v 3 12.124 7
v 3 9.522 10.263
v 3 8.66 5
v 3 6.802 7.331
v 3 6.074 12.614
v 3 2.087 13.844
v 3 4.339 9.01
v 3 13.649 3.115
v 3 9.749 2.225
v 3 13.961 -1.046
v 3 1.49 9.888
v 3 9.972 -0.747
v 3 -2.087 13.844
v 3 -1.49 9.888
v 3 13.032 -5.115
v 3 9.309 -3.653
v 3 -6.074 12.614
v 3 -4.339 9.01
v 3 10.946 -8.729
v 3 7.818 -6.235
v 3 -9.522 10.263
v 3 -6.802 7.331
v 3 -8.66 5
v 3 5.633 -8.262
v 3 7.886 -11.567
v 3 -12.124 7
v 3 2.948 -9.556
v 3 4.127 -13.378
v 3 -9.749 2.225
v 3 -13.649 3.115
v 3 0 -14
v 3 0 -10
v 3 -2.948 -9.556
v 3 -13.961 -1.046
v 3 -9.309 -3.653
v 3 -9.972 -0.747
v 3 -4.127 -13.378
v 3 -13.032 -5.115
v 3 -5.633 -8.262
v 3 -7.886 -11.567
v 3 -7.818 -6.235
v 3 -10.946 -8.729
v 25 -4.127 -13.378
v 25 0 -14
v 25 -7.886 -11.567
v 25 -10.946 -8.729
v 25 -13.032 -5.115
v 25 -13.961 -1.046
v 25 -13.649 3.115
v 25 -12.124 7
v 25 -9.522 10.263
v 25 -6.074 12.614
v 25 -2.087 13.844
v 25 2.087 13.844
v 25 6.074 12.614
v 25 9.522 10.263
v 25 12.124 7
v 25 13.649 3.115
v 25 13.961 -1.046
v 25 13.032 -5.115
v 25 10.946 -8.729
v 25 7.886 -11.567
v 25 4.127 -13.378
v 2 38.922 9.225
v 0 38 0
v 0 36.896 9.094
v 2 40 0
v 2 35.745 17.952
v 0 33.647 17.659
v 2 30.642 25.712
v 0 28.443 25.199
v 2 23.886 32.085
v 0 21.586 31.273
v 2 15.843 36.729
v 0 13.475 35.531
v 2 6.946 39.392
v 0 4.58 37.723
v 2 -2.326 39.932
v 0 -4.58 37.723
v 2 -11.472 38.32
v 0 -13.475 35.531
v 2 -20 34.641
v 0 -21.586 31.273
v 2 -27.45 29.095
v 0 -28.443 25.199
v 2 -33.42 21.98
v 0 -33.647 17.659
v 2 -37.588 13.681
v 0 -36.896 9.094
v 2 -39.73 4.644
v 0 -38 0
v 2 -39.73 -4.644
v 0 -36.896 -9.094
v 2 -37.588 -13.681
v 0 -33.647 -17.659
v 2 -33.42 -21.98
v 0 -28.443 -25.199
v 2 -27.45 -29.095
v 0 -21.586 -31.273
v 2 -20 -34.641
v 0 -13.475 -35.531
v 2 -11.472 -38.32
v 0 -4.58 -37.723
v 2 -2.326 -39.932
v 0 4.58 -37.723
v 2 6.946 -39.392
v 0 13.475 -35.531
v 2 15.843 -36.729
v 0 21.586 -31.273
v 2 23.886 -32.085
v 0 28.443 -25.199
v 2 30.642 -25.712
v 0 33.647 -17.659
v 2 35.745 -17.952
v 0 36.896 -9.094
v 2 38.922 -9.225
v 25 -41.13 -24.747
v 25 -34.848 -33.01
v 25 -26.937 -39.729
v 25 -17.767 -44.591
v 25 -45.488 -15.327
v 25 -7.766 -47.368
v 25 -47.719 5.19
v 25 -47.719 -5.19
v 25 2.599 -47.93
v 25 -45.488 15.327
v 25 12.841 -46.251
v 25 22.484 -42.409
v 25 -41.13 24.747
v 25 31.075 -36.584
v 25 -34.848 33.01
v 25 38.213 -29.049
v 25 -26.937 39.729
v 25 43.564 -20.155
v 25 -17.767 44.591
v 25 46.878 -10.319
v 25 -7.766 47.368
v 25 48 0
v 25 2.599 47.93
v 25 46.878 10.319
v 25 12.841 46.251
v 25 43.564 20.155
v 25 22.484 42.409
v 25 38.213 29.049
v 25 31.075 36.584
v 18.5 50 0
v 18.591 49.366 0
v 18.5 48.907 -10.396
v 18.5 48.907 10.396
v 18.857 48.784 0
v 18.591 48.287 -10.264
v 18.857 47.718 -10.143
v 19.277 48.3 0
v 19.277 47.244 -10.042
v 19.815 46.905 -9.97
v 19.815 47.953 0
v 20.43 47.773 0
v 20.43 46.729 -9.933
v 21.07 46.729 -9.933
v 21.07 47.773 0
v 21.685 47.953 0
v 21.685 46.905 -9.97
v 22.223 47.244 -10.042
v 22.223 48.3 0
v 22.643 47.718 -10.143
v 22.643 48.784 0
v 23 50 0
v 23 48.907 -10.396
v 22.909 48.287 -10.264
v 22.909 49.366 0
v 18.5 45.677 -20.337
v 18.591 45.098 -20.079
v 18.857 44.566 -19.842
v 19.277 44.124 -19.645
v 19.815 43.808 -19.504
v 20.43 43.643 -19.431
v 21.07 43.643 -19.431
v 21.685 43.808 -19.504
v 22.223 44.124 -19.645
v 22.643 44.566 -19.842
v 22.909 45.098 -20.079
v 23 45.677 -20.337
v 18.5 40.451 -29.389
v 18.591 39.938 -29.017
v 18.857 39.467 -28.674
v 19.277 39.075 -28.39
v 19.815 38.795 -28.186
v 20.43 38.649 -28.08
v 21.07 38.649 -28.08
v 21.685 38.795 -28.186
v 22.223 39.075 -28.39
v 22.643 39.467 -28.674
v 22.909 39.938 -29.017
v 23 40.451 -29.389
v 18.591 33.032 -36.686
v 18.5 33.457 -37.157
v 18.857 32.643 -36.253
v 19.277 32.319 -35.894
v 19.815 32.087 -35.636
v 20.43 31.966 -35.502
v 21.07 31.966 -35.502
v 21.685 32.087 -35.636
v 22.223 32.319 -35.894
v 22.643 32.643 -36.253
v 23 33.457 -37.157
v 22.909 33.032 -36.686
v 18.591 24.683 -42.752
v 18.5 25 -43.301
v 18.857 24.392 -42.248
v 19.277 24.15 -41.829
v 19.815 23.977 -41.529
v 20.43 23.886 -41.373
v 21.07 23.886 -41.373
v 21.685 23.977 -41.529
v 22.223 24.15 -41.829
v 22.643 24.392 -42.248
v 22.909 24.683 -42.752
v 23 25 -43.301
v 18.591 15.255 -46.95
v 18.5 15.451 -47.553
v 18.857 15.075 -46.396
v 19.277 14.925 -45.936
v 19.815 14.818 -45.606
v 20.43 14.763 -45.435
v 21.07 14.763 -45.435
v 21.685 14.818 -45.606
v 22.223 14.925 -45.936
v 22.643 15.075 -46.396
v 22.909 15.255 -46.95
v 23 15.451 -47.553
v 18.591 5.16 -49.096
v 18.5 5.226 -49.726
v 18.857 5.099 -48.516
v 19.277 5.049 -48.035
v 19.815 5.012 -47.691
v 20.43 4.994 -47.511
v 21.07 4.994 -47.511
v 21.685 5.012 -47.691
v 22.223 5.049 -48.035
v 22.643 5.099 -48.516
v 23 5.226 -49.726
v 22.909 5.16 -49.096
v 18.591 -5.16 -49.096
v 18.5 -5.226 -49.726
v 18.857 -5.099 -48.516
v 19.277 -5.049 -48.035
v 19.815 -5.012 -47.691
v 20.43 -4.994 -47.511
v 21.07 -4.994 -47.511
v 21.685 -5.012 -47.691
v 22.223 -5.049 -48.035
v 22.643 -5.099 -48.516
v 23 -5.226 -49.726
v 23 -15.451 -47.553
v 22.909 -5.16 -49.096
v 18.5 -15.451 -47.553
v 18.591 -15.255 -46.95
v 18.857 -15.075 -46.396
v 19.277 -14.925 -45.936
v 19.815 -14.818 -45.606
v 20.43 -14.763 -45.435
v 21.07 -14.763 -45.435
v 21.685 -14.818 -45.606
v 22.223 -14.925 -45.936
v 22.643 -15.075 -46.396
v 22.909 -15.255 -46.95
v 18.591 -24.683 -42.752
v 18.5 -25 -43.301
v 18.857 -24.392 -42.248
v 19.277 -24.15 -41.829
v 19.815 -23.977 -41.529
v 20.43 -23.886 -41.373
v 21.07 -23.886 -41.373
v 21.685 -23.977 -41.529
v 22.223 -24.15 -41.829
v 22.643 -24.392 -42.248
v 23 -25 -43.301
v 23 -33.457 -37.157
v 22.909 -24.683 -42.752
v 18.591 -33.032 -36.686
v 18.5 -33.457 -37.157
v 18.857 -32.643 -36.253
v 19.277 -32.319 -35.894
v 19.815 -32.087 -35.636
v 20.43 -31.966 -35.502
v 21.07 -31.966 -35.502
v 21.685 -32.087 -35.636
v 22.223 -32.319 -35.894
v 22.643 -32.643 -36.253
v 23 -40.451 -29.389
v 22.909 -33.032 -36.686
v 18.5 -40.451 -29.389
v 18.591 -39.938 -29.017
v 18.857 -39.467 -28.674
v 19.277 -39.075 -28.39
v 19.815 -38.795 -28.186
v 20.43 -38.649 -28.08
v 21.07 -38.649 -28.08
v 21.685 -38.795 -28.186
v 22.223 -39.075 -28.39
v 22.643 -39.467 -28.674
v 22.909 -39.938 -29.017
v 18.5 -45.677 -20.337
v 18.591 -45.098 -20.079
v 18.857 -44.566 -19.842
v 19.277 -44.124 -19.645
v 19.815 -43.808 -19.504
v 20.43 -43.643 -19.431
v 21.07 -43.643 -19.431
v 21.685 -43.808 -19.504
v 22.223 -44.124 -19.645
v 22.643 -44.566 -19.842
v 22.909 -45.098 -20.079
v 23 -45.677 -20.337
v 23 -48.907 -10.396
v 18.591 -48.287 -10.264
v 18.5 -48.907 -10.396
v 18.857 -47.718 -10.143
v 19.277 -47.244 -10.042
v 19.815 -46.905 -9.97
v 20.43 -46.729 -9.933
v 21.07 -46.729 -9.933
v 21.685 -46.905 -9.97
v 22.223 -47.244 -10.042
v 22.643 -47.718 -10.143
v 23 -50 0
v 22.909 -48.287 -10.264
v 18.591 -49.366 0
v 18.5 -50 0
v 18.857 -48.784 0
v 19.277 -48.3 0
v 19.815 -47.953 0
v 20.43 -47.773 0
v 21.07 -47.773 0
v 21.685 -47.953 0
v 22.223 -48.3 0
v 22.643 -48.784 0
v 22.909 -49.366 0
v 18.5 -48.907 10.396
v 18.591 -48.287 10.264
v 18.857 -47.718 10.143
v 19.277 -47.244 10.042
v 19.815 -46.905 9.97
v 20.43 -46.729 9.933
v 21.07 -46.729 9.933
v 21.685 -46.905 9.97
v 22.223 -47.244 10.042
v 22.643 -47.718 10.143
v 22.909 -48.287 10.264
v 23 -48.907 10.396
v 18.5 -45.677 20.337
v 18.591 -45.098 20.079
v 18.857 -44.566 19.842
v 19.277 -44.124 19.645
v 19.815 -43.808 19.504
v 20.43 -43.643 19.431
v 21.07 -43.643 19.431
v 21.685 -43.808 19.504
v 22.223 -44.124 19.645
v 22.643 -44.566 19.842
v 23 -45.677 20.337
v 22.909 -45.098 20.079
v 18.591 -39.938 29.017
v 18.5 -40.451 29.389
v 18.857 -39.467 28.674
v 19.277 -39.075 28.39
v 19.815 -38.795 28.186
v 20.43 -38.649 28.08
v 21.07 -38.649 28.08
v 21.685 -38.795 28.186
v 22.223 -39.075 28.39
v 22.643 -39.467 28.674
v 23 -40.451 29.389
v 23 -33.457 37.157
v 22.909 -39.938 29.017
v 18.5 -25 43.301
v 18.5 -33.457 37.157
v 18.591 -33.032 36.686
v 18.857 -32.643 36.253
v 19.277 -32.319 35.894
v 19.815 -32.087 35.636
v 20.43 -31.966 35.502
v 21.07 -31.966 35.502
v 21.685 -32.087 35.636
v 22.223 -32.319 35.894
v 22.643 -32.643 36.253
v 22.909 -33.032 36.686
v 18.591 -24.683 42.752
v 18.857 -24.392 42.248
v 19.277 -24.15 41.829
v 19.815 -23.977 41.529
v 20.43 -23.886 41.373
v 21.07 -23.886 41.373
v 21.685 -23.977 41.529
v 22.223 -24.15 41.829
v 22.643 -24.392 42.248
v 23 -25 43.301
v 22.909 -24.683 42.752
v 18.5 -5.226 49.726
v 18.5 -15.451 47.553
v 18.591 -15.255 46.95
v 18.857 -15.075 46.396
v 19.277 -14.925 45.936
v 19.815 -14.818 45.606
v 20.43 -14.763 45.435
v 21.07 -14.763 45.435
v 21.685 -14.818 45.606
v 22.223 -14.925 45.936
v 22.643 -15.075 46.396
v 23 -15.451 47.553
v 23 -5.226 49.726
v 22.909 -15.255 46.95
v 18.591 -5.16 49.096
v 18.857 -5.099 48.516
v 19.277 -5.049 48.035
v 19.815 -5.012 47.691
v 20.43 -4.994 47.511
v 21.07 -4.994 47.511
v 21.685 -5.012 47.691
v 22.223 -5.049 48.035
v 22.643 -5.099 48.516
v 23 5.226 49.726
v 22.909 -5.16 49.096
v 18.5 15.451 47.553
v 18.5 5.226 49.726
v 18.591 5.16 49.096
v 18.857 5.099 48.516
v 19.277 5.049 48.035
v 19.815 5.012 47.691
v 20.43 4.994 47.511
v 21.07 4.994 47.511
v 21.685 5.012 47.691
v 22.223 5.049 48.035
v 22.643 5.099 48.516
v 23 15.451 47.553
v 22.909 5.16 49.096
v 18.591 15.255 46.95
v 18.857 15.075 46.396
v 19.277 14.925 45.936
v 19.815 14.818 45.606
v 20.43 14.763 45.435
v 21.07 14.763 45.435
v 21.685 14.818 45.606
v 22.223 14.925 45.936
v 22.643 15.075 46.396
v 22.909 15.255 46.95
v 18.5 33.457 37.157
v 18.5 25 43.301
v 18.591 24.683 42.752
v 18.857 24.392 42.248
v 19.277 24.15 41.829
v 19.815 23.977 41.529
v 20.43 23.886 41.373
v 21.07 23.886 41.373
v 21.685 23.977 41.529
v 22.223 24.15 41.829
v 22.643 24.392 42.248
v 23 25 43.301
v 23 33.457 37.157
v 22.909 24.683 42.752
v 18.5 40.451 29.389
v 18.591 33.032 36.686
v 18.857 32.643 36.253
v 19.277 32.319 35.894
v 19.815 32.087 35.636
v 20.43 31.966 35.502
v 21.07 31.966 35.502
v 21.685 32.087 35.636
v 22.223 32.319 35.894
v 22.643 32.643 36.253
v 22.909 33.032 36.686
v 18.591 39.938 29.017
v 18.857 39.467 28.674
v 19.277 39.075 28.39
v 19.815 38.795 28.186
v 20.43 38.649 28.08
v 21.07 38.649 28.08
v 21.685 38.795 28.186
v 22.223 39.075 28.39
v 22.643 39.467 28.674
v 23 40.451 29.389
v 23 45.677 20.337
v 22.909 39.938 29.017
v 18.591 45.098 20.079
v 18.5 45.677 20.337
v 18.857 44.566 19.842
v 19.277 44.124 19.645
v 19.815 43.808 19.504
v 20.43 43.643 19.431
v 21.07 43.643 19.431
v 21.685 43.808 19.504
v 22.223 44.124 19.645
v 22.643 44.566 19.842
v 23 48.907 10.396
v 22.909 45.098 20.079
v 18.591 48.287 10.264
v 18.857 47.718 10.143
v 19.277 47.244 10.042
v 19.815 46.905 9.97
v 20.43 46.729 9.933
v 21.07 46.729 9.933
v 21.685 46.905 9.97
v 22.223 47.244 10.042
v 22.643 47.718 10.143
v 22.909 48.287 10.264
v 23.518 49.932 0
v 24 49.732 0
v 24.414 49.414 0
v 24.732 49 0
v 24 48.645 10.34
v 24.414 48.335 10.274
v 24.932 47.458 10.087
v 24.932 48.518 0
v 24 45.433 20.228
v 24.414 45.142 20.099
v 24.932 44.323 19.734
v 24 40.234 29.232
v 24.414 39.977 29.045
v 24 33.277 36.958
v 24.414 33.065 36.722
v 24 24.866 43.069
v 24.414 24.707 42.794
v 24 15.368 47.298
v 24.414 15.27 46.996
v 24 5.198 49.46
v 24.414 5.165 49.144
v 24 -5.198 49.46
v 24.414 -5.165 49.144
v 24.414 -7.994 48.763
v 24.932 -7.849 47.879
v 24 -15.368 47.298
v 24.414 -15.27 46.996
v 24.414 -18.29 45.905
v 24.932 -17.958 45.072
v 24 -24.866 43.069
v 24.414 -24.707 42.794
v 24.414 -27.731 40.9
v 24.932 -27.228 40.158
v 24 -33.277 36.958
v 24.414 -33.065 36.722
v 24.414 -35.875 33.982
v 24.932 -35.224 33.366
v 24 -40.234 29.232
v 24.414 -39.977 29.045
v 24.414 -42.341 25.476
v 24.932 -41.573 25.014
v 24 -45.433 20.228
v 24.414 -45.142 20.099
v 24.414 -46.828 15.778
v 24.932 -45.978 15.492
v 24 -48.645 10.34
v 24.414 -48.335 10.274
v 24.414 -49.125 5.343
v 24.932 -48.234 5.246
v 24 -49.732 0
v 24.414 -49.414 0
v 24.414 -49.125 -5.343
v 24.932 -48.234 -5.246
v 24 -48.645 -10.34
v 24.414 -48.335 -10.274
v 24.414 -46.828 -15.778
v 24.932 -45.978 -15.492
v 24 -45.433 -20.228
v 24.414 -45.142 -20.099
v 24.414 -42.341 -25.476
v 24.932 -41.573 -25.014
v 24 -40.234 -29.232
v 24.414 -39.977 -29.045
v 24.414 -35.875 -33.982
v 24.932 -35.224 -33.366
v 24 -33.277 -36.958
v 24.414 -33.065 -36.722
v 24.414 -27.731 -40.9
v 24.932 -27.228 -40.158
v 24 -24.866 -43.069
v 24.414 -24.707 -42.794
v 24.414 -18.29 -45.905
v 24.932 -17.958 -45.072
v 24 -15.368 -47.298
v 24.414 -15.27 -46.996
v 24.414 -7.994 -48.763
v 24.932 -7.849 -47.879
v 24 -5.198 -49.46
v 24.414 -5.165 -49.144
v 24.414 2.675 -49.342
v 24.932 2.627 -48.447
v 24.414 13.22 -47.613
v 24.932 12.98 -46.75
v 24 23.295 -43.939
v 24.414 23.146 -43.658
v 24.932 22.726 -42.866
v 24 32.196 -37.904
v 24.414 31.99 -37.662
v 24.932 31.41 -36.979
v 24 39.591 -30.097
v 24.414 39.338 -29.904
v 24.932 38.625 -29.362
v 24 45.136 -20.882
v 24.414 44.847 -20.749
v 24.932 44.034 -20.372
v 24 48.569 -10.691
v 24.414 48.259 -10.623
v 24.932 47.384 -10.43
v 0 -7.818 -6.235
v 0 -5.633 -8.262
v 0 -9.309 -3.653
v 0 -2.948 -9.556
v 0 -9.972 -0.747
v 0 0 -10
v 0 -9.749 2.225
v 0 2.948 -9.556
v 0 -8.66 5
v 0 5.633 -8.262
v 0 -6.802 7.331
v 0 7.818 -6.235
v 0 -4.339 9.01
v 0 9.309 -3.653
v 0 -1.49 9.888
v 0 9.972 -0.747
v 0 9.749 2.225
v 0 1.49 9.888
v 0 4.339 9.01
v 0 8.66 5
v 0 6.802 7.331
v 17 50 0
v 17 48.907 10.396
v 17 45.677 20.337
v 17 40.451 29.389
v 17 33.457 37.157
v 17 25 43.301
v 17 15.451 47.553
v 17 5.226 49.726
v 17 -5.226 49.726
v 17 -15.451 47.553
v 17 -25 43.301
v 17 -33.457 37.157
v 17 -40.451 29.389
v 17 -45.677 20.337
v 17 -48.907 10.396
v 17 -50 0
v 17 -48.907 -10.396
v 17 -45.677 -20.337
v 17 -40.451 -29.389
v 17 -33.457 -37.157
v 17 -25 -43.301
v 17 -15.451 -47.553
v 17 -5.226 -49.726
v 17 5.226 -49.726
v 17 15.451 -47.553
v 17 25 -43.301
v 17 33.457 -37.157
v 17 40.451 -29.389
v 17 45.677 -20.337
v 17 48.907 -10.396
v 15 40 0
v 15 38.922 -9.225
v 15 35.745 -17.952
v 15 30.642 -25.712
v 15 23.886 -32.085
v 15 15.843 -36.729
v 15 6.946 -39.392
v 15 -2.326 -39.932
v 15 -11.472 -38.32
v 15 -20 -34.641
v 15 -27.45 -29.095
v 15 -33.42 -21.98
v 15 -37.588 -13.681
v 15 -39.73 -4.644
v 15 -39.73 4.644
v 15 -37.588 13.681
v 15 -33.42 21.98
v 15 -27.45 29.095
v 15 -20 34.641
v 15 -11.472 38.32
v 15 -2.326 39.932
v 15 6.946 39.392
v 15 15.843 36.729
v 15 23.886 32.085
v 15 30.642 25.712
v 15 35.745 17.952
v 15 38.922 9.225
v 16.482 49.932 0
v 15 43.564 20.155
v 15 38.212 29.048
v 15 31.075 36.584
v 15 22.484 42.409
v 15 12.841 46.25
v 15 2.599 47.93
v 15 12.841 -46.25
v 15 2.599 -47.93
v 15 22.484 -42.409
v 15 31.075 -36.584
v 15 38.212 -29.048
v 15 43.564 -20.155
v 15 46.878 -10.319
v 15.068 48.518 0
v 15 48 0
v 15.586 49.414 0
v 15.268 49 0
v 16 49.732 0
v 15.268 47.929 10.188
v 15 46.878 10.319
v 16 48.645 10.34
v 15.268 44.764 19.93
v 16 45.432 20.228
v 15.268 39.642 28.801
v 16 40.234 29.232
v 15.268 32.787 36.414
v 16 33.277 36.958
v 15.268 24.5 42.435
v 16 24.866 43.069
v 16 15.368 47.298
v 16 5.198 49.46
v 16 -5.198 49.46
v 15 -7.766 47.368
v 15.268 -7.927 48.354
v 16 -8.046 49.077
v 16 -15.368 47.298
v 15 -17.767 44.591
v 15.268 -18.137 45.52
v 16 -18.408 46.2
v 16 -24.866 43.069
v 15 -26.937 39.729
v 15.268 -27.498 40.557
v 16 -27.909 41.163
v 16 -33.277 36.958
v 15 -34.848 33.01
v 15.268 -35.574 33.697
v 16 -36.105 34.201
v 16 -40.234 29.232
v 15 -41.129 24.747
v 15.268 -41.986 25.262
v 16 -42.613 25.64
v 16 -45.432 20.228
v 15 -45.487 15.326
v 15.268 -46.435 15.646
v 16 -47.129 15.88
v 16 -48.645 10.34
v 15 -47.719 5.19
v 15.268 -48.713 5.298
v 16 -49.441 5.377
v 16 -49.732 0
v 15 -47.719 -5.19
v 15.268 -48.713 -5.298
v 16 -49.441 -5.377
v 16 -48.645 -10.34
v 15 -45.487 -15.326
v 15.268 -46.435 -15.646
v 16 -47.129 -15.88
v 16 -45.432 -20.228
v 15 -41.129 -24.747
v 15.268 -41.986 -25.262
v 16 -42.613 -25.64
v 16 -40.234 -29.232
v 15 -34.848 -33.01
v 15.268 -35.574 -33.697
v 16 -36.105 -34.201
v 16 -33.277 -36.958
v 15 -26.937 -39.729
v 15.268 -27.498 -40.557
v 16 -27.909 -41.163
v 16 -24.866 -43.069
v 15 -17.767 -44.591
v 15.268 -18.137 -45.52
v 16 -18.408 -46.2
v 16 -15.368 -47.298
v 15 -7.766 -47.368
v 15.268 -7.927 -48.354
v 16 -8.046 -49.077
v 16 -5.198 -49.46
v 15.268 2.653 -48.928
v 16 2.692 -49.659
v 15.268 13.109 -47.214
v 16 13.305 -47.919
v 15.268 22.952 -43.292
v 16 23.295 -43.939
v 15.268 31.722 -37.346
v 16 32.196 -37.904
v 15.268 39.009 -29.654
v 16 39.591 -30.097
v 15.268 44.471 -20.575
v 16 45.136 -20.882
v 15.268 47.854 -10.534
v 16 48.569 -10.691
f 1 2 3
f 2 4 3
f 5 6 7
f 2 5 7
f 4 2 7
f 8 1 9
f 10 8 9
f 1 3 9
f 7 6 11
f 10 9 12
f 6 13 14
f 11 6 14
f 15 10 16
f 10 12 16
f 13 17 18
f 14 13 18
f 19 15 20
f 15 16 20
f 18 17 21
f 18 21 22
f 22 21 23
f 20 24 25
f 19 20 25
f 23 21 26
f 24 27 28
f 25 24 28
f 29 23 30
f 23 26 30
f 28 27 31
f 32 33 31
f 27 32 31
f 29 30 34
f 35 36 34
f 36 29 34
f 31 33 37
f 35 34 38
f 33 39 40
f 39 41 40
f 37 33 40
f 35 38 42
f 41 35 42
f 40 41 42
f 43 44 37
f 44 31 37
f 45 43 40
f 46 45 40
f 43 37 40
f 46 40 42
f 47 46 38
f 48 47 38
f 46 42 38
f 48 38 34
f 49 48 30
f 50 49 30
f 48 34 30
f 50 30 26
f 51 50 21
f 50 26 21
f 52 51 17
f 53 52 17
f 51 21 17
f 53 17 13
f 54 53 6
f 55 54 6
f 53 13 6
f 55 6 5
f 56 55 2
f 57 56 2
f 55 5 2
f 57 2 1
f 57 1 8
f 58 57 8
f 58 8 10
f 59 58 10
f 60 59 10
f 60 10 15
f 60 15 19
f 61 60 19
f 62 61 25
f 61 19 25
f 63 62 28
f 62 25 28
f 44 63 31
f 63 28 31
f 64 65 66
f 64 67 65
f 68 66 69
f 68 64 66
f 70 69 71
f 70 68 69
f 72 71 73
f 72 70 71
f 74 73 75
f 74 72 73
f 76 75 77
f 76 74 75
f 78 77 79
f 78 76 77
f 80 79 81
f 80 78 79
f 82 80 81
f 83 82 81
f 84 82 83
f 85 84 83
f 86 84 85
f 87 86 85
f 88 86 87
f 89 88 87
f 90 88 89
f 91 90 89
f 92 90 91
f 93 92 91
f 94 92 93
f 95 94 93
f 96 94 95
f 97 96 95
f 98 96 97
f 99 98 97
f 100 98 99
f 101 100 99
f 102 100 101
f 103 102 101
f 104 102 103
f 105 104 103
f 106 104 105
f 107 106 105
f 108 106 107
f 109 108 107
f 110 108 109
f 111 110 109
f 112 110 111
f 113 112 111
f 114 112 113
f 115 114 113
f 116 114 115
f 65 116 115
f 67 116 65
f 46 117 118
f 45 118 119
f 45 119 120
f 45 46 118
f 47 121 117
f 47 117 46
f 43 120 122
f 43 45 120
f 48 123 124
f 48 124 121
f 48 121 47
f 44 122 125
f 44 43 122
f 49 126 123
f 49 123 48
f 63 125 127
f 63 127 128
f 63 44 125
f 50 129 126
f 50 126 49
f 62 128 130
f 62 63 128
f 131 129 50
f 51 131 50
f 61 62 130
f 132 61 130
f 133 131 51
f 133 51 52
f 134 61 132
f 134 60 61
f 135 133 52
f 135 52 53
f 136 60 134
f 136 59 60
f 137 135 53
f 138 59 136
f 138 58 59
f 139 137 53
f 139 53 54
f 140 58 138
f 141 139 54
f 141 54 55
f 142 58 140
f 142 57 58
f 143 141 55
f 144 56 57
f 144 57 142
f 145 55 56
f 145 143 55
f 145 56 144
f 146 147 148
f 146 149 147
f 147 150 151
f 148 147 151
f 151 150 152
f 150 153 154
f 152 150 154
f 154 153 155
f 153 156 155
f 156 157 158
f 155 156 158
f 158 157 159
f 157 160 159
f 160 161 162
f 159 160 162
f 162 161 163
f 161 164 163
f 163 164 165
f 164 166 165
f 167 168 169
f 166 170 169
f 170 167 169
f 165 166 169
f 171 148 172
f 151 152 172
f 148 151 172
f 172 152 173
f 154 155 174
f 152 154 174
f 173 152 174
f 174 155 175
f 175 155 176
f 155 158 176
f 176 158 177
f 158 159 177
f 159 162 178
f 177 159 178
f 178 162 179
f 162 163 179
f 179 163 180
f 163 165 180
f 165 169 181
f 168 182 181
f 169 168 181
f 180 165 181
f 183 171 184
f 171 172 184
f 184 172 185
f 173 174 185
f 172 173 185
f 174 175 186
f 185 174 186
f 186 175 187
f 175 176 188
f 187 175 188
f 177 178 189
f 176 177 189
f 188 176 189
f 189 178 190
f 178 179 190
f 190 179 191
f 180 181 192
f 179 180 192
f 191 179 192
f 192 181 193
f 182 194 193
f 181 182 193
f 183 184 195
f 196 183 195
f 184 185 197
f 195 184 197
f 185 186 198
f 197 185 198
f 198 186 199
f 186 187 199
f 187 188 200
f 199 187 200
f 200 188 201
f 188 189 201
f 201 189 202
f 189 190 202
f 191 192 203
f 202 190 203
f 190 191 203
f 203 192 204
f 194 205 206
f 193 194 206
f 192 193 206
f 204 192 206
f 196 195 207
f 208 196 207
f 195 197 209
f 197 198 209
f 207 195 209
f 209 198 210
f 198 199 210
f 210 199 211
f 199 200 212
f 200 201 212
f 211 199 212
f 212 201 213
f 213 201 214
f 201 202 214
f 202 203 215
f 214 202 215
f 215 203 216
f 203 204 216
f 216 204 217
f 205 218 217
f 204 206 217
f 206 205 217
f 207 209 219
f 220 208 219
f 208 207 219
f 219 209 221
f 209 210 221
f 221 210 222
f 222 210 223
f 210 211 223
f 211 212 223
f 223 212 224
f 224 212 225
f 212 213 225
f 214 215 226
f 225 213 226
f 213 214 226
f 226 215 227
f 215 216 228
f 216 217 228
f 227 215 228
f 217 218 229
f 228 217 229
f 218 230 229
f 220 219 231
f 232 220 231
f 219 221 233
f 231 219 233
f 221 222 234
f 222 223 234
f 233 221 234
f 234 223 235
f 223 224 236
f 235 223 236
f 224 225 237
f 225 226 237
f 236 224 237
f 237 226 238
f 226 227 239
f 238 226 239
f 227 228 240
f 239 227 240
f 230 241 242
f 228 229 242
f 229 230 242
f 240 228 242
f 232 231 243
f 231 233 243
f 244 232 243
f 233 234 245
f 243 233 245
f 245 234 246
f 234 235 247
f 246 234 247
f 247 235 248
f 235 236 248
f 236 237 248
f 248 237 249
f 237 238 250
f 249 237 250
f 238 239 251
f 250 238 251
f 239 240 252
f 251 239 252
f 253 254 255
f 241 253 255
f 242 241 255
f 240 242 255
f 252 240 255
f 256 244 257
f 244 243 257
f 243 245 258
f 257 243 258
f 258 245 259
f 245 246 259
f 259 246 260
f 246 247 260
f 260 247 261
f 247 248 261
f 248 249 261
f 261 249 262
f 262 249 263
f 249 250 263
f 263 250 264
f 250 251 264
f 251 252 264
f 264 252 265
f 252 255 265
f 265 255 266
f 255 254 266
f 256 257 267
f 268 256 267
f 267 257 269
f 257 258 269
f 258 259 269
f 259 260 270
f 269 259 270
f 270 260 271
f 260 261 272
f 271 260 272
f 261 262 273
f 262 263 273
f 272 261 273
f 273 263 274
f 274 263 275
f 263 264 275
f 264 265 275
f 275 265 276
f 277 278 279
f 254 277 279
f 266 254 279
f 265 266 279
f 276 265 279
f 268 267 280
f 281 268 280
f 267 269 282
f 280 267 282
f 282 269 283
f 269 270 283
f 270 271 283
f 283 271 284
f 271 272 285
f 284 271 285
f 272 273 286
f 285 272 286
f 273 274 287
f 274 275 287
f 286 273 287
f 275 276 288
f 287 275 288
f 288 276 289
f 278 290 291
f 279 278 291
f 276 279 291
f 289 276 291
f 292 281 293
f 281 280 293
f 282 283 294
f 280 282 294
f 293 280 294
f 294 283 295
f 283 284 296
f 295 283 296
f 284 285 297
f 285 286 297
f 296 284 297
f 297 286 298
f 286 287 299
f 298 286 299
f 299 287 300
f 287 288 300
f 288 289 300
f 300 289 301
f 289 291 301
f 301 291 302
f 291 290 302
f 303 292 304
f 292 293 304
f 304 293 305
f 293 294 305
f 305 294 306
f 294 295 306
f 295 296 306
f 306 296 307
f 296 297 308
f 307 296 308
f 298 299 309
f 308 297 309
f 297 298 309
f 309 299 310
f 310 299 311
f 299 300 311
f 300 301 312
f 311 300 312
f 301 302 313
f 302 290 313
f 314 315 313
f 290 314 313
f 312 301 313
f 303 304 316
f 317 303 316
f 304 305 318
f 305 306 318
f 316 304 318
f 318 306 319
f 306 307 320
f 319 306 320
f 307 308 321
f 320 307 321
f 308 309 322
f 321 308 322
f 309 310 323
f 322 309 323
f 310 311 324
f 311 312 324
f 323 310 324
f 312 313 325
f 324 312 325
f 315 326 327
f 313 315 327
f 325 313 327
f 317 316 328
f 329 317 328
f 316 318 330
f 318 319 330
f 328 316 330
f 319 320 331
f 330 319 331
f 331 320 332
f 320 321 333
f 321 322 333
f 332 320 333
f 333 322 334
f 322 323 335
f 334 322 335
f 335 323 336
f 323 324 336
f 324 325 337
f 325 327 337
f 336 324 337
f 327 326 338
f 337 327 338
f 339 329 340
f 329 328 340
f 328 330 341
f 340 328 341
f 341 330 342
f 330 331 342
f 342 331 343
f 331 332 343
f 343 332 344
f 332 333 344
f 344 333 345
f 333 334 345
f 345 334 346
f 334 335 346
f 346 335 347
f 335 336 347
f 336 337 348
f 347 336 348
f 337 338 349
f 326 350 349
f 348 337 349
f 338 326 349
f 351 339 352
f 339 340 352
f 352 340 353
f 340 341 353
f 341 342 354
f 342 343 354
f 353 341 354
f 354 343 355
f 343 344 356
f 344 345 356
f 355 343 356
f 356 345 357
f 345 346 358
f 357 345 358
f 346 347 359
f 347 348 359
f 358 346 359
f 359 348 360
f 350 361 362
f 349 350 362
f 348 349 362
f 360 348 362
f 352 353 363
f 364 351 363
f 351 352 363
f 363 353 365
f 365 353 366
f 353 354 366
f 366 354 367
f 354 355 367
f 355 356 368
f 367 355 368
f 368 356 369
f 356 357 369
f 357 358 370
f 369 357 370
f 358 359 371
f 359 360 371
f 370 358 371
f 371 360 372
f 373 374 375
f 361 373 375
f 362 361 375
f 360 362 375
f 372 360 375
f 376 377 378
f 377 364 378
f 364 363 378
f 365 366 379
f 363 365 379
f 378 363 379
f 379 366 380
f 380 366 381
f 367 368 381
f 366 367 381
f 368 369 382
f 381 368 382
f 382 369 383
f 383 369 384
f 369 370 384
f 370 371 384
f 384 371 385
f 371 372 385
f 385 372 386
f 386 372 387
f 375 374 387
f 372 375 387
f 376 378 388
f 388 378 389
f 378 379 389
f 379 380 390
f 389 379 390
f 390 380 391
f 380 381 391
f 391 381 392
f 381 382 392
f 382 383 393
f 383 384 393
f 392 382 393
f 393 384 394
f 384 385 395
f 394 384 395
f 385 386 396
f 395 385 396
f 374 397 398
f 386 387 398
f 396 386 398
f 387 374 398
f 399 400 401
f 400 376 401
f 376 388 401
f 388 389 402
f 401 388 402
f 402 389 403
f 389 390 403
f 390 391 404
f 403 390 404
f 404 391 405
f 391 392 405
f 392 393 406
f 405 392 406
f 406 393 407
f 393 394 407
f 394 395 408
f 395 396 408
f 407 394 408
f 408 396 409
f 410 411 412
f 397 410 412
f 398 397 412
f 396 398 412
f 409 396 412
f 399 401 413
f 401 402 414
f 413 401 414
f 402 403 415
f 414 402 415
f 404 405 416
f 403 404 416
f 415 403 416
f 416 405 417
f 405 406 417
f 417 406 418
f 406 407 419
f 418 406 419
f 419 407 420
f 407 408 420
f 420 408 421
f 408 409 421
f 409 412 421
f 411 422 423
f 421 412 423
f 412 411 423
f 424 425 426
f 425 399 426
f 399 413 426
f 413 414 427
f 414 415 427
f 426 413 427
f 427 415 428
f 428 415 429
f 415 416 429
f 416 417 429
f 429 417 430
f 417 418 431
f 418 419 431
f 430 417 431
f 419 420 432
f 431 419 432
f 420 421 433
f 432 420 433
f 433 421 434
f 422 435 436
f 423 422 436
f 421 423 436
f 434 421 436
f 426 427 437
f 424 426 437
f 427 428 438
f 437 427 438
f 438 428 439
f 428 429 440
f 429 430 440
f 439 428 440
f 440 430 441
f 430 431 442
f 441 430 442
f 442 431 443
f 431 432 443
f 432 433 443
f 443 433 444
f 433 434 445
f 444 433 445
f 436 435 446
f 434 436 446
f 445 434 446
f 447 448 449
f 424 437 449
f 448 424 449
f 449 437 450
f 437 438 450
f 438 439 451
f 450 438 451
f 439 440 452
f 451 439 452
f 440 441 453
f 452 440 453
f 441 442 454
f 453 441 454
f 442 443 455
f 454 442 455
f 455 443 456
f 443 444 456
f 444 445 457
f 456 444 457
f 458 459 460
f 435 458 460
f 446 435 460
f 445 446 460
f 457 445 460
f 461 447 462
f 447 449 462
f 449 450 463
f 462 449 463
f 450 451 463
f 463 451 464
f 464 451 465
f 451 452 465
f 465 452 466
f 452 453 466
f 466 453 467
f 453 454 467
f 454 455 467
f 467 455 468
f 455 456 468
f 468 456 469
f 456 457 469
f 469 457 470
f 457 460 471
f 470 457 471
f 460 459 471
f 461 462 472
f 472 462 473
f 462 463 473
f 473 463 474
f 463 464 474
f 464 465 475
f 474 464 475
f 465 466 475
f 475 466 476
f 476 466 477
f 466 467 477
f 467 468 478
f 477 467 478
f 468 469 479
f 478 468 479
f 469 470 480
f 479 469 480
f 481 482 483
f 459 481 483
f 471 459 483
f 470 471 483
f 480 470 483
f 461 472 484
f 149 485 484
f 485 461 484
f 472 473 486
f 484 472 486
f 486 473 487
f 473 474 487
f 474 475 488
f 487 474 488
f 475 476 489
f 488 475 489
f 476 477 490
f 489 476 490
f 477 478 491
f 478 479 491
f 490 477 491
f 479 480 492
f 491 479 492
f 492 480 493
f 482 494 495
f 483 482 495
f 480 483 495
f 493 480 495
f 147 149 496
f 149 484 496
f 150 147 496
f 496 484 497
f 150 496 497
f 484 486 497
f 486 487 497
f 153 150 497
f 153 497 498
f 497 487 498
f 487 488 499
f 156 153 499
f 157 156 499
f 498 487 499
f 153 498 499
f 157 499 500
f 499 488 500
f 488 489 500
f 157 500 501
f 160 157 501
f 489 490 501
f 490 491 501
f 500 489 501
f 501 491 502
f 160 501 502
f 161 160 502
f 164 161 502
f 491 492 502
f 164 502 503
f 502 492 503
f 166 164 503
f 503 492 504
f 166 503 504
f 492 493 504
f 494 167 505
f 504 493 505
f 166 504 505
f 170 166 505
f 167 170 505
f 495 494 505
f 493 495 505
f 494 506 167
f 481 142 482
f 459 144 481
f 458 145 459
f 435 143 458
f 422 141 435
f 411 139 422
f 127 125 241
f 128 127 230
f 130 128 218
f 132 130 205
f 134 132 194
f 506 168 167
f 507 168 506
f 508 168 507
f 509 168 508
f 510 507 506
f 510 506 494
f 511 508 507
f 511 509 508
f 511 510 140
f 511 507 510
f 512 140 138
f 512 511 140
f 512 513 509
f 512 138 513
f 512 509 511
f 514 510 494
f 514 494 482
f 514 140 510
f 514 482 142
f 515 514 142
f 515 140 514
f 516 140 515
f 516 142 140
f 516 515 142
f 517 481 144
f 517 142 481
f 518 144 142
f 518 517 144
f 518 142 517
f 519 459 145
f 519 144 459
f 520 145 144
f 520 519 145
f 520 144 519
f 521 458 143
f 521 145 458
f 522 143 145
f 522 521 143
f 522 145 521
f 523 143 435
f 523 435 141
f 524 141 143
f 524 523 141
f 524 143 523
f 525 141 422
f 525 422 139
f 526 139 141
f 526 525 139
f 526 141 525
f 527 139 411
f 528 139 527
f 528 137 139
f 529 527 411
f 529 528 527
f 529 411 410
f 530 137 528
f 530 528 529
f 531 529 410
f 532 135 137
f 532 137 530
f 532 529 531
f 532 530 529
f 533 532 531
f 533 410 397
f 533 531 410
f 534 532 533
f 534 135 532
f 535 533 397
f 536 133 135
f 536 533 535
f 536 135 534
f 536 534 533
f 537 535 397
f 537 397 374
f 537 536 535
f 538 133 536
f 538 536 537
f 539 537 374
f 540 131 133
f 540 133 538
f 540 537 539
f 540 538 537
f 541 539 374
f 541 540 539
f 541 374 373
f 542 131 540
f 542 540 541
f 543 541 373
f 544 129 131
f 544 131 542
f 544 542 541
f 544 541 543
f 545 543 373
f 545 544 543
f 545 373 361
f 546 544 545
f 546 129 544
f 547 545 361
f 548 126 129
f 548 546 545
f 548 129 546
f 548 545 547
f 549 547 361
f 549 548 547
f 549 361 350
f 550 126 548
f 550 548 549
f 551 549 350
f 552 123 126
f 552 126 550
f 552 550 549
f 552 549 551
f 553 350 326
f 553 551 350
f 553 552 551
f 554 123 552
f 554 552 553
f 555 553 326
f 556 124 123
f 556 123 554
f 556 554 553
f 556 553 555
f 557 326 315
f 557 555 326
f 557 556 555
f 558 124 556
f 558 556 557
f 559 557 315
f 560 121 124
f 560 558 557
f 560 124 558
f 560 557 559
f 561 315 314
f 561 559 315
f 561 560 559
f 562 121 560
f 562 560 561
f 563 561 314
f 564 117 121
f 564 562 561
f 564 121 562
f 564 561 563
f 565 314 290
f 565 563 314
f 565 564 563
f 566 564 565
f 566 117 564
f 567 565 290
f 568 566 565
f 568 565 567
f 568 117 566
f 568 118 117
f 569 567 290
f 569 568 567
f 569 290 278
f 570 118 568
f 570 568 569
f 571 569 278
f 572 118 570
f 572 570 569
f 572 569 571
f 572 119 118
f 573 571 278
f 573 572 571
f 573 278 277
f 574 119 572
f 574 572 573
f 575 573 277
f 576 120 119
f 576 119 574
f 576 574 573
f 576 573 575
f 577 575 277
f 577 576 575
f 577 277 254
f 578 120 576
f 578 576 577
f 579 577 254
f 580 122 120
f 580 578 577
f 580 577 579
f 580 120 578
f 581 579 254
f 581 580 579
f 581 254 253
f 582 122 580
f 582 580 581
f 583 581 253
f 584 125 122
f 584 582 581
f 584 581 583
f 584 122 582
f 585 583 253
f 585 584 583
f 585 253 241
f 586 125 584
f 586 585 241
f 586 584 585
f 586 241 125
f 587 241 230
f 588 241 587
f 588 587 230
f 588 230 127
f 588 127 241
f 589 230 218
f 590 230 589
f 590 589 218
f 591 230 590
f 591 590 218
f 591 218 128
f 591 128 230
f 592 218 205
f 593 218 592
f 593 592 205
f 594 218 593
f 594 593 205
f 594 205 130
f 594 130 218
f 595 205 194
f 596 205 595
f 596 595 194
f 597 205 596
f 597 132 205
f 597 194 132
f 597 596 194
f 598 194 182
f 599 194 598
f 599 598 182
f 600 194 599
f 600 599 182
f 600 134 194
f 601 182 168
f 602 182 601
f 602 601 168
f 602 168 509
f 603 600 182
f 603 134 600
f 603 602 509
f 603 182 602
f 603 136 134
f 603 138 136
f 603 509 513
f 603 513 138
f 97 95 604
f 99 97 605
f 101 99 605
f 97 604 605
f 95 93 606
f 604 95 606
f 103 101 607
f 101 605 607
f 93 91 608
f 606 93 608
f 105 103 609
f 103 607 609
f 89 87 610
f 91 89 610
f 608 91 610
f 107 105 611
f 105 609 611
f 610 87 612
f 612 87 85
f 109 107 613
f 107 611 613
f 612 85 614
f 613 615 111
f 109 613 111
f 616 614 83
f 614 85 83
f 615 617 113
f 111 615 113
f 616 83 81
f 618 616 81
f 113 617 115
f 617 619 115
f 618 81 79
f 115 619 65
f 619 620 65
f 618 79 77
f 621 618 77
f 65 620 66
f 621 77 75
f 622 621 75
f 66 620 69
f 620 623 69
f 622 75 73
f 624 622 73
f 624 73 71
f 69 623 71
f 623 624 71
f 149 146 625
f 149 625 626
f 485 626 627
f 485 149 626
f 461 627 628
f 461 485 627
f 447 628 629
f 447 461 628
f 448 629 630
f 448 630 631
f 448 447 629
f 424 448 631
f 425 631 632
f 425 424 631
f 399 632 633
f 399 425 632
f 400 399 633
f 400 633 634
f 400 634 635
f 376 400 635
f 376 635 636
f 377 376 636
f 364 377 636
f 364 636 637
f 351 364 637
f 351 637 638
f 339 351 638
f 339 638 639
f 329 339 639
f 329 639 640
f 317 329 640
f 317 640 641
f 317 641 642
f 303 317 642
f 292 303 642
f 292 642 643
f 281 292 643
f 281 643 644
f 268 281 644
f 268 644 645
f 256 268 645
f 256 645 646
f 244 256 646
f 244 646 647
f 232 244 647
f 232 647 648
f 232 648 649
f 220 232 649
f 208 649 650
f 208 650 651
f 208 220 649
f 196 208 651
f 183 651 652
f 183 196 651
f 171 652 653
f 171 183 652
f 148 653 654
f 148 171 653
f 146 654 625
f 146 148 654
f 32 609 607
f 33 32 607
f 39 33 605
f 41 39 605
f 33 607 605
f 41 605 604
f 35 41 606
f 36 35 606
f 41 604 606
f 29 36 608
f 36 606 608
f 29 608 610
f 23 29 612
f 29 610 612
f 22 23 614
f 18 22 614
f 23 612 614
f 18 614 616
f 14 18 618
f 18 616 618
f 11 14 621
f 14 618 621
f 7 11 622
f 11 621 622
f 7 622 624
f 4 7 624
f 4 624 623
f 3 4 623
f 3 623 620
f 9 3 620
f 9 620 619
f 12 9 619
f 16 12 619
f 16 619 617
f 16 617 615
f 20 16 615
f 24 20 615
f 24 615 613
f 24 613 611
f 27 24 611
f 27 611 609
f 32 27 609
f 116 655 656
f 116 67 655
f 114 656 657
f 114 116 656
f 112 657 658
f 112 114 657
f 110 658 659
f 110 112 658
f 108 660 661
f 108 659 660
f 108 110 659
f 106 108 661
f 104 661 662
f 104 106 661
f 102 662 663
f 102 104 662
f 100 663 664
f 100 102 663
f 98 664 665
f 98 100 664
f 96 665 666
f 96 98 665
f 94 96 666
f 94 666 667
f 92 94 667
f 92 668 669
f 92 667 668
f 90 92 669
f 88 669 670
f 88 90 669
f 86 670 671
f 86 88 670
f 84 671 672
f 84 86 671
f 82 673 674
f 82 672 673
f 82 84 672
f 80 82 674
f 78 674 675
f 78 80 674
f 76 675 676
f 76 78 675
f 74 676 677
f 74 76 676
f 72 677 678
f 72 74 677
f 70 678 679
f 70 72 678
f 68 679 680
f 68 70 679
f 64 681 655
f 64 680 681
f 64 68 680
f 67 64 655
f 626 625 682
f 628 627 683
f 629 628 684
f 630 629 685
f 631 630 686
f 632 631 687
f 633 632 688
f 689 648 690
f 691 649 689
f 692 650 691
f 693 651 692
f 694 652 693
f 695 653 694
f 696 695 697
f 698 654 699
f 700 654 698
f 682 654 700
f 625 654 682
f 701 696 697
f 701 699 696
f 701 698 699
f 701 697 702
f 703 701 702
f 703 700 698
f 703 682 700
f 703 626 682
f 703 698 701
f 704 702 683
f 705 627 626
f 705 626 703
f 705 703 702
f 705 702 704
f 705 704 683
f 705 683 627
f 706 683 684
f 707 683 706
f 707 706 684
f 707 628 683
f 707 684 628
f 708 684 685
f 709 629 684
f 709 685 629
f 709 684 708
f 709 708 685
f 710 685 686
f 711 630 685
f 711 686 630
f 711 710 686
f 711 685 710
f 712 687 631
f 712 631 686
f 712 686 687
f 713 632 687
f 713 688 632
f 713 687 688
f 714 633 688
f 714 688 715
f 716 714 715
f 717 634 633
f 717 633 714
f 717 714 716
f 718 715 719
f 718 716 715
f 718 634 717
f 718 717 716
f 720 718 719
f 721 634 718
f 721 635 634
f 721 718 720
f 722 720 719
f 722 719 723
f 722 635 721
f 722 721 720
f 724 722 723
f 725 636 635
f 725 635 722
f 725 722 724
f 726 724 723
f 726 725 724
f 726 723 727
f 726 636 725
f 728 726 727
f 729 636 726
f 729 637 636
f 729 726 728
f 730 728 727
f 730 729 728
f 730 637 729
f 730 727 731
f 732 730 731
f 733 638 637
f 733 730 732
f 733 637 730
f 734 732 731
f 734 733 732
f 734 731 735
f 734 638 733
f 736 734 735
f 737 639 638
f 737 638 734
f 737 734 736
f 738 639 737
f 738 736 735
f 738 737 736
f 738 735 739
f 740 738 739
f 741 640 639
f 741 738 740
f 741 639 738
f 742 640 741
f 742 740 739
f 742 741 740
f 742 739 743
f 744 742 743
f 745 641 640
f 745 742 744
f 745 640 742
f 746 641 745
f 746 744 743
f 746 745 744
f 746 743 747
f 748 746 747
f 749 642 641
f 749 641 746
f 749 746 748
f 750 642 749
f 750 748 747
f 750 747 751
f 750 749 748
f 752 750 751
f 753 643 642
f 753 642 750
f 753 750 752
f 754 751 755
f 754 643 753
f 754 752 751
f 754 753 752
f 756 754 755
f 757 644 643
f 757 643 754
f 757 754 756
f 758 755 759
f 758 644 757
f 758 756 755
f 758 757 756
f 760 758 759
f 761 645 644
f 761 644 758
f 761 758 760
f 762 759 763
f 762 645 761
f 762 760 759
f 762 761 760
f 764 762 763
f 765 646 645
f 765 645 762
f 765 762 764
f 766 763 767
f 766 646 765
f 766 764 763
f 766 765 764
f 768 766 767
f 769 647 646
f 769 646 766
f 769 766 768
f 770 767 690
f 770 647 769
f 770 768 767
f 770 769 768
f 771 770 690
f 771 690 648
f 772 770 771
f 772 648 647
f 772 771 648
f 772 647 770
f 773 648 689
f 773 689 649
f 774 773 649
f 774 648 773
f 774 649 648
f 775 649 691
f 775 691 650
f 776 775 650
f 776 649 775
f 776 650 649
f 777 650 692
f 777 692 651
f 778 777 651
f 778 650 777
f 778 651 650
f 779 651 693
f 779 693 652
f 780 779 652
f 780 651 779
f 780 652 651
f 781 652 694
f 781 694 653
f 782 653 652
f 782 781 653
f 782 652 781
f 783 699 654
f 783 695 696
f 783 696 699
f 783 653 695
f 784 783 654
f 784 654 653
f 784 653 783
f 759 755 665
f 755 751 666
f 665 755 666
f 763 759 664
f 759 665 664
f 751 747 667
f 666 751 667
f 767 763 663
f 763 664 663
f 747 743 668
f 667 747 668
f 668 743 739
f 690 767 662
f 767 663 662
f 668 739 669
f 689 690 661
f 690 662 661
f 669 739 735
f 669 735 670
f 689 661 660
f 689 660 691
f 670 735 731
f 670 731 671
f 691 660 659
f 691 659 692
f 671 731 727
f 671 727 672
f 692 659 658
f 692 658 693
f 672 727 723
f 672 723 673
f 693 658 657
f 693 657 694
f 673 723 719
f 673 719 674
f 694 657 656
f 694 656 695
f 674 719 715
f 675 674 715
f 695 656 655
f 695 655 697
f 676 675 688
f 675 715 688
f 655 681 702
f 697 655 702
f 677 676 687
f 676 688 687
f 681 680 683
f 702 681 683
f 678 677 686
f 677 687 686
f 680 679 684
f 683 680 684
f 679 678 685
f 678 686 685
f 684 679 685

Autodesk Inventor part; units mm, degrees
ref_plane "YZ Plane" through (0, 0, 0) normal (1, 0, 0) x (0, 1, 0)
ref_plane "XZ Plane" through (0, 0, 0) normal (0, 1, 0) x (-1, 0, 0)
ref_plane "XY Plane" through (0, 0, 0) normal (0, 0, 1) x (1, 0, 0)
sketch "Sketch1" plane through (0, 0, 0) normal (0, 0, 1) x (1, 0, 0)
  line L0 (0, 0) -> (25, 0)
  line L1 (25, 0) -> (25, 50)
  line L2 (15, 50) -> (15, 40)
  line L3 (15, 40) -> (0, 40)
  line L4 (0, 40) -> (0, 0)
  line L5 (15, 50) -> (18.5, 50)
  line L6 (18.5, 50) -> (18.5, 47)
  line L7 (18.5, 47) -> (23, 47) construction
  line L8 (23, 47) -> (23, 50)
  line L9 (23, 50) -> (25, 50)
  circle A0 centre (20.75, 50) radius 2.25 construction
  line L10 (18.5, 50) -> (23, 50) construction
  arc A1 (18.5, 50) -> (23, 50) centre (20.75, 50) ccw
  point P0 (23, 48.5)
  point P1 (20.75, 50)
  dimension "d1" = 40
  dimension "d2" = 15
  dimension "d3" = 10
  dimension "d5" = 50
  dimension "d6" = 3
  dimension "d7" = 4.5
  dimension "d8" = 2
revolve "Revolution1" add sketch "Sketch1" angle 360 about axis through (0, 0, 0) along (1, 0, 0)
fillet "Fillet2" radius 2 1 edges at (15, -50, 0)
fillet "Fillet3" radius 2 1 edges at (25, -50, 0)
chamfer "Chamfer1" distance 2 angle 45 1 edges at (0, -40, 0)
sketch "Sketch2" plane through (25, 0, 0) normal (1, 0, 0) x (0, 0, -1)
  circle A0 centre (0, 0) radius 48 projected
hole "Hole1" at (25, 0, 0) direction (-1, 0, 0) diameter 20 end through all
sketch "Sketch3" plane through (25, 0, 0) normal (1, 0, 0) x (0, 0, -1)
  circle A0 centre (0, 0) radius 10 projected
  circle A1 centre (0, 0) radius 48 projected
hole "Hole2" at (25, 0, 0) direction (-1, 0, 0) diameter 28 depth 22
properties part number "P302" material "Aluminum 6061"
